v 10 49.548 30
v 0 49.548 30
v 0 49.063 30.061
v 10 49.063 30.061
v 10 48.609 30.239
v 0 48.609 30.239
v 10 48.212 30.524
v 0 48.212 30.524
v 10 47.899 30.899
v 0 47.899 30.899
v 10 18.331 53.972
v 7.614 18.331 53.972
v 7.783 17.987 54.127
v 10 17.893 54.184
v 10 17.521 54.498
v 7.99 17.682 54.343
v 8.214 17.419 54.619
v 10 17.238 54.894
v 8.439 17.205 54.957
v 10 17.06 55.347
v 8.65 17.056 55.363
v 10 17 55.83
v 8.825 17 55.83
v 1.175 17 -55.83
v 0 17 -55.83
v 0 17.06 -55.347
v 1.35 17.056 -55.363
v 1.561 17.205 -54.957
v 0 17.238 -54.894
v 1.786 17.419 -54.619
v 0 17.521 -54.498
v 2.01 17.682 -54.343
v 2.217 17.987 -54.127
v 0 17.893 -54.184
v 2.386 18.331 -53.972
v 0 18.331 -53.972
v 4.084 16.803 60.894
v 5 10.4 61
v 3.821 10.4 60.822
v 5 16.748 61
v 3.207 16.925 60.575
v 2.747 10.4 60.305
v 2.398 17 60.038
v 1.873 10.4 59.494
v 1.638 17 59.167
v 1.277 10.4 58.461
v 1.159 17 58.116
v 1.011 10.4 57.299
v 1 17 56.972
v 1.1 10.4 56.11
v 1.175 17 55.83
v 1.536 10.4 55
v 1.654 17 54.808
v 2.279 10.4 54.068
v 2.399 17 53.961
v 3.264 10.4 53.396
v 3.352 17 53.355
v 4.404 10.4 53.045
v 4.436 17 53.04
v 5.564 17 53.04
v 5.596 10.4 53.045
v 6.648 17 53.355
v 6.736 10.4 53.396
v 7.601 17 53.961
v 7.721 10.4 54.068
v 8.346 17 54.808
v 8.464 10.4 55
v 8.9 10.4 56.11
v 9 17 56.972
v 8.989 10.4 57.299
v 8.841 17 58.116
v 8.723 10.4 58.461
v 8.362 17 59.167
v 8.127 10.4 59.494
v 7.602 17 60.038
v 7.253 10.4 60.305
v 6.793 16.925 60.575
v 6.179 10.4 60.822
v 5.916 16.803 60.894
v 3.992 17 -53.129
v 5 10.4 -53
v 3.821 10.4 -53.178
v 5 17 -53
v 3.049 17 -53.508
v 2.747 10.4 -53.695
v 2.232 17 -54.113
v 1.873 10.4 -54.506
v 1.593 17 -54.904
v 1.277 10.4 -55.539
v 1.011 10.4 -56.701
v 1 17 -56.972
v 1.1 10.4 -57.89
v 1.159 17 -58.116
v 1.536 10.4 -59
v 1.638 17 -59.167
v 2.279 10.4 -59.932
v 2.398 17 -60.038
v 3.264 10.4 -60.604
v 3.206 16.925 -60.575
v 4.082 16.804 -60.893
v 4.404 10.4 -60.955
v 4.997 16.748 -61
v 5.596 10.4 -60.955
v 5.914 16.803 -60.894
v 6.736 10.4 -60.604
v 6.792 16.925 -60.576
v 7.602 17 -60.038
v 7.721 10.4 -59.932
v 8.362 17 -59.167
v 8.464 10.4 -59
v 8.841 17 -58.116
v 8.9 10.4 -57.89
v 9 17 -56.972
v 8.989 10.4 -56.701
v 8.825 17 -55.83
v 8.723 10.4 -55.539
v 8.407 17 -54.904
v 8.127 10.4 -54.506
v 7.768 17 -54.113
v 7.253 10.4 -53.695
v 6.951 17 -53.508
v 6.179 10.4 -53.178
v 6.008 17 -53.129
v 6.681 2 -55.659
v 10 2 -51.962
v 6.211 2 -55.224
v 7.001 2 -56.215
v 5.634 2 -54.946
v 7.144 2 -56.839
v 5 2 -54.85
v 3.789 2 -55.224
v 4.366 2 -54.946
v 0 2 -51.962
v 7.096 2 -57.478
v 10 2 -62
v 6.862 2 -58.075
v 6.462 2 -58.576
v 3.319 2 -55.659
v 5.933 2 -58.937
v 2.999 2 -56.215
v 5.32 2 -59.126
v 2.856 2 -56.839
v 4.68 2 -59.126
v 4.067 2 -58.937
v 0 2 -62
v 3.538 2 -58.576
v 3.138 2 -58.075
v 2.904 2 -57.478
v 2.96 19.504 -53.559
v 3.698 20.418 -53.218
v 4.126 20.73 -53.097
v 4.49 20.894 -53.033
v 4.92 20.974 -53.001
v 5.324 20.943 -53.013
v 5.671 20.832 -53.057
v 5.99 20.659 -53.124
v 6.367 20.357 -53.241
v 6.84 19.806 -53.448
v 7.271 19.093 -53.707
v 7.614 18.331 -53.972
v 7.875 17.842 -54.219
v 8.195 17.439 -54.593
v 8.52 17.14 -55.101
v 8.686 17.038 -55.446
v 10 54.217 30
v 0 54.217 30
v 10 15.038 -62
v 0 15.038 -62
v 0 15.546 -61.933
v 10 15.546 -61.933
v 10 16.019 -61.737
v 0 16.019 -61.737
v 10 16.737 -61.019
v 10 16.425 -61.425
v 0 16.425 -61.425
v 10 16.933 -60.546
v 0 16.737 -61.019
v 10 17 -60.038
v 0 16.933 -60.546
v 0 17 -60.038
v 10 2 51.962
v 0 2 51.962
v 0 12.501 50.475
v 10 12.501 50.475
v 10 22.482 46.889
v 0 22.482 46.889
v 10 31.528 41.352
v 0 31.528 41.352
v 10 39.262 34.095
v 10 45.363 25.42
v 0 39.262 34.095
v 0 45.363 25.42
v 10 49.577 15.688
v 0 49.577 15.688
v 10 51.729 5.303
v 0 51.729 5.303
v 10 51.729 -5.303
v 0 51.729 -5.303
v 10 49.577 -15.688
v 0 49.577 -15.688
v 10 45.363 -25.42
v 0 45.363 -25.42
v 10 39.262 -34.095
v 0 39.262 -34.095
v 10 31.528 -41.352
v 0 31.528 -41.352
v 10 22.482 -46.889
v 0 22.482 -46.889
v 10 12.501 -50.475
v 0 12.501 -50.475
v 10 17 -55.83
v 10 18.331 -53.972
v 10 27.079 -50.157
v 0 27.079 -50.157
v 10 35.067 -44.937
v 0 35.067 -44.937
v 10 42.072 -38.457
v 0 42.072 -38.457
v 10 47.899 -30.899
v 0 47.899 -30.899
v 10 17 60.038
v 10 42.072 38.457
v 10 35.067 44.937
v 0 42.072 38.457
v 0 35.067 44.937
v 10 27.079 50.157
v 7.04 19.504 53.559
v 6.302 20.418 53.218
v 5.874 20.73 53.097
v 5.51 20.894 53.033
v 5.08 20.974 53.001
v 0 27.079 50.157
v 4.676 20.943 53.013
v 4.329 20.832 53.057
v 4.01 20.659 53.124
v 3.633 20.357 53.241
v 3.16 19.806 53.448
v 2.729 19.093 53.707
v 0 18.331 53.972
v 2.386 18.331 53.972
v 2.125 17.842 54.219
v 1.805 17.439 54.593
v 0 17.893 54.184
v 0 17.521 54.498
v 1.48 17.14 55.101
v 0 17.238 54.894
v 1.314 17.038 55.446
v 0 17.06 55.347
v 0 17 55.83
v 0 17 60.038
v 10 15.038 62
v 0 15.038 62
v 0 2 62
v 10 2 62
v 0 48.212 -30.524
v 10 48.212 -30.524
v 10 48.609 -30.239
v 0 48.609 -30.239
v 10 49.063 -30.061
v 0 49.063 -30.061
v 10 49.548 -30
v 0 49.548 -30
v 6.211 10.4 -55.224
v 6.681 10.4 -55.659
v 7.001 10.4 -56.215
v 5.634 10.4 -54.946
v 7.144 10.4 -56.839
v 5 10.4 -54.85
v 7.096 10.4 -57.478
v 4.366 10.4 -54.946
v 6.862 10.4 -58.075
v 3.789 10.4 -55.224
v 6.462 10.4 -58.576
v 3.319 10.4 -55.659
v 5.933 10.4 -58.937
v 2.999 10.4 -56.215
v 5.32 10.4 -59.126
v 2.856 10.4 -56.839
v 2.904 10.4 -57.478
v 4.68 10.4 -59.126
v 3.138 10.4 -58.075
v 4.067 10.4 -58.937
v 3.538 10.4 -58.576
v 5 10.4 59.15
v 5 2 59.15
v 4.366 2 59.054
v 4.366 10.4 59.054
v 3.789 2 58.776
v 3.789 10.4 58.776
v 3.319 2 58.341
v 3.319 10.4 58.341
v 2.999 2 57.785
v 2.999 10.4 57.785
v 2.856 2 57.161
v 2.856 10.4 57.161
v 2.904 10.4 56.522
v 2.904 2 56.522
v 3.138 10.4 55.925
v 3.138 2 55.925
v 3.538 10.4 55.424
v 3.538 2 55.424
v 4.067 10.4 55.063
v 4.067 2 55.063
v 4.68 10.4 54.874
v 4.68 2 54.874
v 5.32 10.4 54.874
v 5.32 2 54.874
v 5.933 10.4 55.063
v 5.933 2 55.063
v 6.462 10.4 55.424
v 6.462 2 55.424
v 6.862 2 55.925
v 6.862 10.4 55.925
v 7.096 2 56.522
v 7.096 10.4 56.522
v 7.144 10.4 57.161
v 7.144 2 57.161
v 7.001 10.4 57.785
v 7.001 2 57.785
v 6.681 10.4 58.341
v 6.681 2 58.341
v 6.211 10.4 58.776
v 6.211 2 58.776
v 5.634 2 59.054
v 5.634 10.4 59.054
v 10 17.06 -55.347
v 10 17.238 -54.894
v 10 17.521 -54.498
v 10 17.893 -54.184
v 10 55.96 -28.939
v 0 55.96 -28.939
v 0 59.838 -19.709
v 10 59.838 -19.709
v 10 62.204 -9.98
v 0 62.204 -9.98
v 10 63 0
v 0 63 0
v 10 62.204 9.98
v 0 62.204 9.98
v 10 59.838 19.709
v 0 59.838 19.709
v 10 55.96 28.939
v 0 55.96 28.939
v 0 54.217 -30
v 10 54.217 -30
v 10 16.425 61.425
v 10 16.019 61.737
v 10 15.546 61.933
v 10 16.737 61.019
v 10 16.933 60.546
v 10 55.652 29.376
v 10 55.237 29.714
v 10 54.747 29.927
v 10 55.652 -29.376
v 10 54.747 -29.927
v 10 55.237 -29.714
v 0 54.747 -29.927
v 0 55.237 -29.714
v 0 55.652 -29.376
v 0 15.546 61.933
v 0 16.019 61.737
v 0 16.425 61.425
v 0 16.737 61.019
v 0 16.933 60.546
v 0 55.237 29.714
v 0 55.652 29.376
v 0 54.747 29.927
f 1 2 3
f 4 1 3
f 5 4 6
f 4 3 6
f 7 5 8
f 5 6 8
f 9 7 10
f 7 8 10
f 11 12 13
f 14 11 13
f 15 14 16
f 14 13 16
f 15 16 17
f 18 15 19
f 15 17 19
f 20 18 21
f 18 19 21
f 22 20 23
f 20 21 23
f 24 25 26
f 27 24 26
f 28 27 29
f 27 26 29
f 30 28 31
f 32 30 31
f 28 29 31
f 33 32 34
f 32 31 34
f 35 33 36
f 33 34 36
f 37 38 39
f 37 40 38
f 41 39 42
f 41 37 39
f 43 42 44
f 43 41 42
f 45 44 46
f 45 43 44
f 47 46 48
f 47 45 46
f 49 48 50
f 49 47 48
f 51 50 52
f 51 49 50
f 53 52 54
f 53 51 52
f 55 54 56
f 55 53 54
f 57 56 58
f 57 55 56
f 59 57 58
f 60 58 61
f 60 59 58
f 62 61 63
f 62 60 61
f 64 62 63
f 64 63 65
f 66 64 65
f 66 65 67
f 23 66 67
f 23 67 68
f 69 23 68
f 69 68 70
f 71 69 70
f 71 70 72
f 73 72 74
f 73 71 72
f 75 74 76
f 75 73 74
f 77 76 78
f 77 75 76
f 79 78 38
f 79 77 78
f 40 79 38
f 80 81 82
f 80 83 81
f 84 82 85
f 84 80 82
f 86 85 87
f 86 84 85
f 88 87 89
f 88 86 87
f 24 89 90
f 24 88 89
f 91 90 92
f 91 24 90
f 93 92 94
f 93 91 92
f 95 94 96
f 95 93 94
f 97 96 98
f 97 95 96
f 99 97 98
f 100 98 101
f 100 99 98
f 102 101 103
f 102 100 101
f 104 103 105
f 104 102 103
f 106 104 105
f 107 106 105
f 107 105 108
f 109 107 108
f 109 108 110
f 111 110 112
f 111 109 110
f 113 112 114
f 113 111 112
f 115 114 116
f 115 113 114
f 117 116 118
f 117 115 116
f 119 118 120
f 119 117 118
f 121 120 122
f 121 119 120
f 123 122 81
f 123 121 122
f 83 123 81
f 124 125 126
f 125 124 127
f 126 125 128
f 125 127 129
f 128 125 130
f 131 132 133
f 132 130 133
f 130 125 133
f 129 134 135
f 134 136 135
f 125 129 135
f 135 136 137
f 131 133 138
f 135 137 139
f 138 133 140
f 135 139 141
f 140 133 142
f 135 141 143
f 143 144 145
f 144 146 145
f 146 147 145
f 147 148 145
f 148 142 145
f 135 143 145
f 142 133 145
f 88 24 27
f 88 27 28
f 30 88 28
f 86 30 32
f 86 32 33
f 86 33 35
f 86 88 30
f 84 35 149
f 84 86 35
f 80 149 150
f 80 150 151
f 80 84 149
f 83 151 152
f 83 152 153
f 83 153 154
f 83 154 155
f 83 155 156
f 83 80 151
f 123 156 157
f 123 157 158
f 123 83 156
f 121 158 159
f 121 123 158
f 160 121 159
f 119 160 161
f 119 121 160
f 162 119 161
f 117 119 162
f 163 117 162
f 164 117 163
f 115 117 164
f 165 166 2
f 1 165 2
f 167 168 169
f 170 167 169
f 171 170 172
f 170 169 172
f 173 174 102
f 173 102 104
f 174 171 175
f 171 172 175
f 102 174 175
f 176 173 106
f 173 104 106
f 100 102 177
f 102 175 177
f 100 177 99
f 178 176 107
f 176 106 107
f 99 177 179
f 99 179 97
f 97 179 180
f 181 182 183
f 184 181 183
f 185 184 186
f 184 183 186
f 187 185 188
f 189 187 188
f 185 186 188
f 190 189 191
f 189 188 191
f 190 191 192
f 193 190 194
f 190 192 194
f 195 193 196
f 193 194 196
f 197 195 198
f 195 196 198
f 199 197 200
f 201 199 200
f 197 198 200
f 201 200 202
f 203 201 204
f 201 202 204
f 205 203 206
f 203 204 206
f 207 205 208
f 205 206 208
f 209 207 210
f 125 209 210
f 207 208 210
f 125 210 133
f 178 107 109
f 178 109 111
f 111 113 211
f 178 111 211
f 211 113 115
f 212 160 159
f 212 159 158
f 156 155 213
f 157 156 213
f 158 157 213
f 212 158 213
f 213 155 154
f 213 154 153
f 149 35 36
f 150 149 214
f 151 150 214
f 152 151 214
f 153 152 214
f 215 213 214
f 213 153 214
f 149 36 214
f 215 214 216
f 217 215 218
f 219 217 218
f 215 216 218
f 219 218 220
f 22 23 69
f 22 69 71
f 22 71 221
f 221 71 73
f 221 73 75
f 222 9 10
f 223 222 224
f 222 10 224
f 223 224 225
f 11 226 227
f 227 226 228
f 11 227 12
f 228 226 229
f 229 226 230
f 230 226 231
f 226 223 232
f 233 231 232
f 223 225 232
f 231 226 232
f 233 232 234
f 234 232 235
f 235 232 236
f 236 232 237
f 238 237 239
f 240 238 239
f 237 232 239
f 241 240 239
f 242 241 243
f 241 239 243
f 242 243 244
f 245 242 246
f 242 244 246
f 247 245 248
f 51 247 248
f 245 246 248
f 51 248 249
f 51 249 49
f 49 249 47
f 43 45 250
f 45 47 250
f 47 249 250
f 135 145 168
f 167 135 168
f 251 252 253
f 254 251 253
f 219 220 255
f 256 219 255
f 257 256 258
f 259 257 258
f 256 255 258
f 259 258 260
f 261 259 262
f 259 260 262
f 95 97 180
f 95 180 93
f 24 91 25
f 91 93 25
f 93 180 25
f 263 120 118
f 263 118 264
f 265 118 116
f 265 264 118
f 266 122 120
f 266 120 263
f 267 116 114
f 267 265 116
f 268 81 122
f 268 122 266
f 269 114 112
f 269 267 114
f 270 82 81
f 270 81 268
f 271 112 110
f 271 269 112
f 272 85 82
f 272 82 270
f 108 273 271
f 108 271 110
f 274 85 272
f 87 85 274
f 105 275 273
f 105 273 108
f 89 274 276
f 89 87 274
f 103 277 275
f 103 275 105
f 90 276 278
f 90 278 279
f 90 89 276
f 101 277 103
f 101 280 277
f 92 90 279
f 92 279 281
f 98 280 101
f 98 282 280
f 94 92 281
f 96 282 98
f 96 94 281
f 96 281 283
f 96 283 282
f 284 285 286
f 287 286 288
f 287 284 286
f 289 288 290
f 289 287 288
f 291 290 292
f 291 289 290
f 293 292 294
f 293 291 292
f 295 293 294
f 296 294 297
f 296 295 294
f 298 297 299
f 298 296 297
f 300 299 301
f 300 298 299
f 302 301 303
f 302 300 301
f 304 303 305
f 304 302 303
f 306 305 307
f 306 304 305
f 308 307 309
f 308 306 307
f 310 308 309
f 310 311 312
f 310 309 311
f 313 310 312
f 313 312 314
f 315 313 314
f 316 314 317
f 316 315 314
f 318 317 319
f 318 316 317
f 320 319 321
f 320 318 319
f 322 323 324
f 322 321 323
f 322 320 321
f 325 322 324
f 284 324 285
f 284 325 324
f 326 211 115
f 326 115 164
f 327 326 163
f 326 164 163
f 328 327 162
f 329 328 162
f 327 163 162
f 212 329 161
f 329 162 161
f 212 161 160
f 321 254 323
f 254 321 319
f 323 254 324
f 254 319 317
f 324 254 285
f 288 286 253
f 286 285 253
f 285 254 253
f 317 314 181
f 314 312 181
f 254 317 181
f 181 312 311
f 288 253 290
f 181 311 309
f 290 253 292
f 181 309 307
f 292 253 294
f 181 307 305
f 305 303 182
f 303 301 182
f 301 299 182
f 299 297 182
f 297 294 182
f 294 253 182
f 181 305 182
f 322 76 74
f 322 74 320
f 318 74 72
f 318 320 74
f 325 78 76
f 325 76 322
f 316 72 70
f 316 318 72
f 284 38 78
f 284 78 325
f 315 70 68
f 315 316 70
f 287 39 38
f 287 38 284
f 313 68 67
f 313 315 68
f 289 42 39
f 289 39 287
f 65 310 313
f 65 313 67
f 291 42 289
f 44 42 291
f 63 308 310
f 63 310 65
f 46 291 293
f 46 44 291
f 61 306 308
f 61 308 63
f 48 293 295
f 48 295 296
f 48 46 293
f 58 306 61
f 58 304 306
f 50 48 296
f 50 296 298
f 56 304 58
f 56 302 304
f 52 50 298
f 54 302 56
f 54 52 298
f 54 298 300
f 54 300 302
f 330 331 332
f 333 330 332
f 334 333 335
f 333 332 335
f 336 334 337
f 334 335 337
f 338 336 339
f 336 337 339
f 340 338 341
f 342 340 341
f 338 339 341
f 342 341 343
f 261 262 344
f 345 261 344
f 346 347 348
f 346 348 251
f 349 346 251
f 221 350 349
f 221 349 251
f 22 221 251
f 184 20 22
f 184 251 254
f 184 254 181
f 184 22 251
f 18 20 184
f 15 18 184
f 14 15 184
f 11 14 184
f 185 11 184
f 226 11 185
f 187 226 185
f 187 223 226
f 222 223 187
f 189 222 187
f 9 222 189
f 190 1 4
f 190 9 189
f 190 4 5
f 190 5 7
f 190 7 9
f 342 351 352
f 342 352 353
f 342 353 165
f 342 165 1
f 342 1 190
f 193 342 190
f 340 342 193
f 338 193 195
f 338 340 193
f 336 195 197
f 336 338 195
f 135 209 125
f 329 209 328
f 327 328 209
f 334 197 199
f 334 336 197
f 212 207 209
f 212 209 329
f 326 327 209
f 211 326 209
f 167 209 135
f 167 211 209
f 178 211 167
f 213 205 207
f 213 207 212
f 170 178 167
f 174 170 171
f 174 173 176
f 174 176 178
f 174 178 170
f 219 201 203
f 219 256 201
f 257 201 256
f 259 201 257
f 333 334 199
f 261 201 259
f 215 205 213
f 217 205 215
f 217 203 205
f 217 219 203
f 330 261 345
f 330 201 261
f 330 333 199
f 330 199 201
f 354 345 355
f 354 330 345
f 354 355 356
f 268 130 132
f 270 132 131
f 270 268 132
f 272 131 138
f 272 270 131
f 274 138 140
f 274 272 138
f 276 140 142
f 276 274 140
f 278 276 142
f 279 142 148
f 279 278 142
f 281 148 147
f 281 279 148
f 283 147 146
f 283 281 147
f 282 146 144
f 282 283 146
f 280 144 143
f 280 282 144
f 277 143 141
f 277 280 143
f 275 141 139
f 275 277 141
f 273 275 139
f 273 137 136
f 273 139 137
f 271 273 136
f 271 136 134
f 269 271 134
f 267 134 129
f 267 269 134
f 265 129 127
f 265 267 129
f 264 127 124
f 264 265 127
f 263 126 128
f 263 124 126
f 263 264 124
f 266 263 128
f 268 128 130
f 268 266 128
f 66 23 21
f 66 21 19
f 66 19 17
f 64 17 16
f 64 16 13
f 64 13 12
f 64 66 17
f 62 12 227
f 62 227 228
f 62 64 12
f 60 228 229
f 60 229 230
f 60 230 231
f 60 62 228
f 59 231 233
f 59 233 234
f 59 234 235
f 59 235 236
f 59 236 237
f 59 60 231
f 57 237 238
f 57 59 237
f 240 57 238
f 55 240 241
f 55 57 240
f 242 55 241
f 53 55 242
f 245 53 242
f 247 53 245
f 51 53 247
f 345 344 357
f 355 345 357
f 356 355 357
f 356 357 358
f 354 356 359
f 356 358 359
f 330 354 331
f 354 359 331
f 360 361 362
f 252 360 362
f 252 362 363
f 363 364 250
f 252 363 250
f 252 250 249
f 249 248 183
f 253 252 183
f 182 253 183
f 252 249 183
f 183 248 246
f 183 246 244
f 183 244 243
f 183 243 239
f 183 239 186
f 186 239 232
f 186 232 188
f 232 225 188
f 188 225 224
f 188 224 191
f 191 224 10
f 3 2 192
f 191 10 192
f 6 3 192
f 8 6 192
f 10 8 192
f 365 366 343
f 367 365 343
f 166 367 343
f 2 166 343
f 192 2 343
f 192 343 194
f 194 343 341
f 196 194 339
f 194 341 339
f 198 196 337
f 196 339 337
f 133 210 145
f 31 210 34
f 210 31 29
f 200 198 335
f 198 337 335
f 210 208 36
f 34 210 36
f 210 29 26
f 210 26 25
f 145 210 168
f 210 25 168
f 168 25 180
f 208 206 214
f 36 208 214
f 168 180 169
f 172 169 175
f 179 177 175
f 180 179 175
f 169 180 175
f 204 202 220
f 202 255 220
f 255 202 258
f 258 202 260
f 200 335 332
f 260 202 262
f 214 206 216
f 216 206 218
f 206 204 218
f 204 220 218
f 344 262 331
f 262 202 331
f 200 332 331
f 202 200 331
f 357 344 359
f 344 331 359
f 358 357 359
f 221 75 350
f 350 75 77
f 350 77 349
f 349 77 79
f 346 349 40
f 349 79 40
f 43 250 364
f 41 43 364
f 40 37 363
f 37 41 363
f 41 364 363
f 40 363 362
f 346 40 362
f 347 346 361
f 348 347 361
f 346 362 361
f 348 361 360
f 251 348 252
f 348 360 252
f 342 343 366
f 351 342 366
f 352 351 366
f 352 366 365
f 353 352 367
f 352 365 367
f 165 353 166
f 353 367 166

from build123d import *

# Parameters (mm, degrees)
BOSS_EXTRUDE1_DEPTH                        = 10
CBORE_FOR_M4_CHEESE_HEAD_SCREW1_AT_2_COUNT = 2
CBORE_FOR_M4_CHEESE_HEAD_SCREW1_AT_2_PITCH = 114
SKETCH6_R                                  = 4
CUT_EXTRUDE1_DEPTH                         = 8


with BuildPart() as part:
    # Sketch1 → Boss-Extrude1 (new body)
    with BuildSketch(Plane(origin=(0, 0, 0), x_dir=(0, 0, -1), z_dir=(1, 0, 0))):
        with BuildLine():
            Line((30, 49.547642934), (30, 54.216993929))
            ThreePointArc((30, 54.216993929), (29.713903717, 55.237294084), (28.93903477, 55.960095305))
            ThreePointArc((28.93903477, 55.960095305), (0, 63), (-28.93903477, 55.960095305))
            ThreePointArc((-28.93903477, 55.960095305), (-29.713903717, 55.237294084), (-30, 54.216993929))
            Line((-30, 54.216993929), (-30, 49.547642934))
            ThreePointArc((-30, 49.547642934), (-30.239236403, 48.608646152), (-30.898614566, 47.898597244))
            ThreePointArc((-30.898614566, 47.898597244), (-44.936698638, 35.066980416), (-53.971882891, 18.331280838))
            ThreePointArc((-53.971882891, 18.331280838), (-54.687108259, 17.367169566), (-55.830018745, 17))
            Line((-55.830018745, 17), (-60.037612586, 17))
            ThreePointArc((-60.037612586, 17), (-61.425230034, 16.425230034), (-62, 15.037612586))
            Line((-62, 15.037612586), (-62, 2))
            Line((-62, 2), (-51.961524227, 2))
            ThreePointArc((-51.961524227, 2), (0, 52), (51.961524227, 2))
            Line((51.961524227, 2), (62, 2))
            Line((62, 2), (62, 15.037612586))
            ThreePointArc((62, 15.037612586), (61.425230034, 16.425230034), (60.037612586, 17))
            Line((60.037612586, 17), (55.830018745, 17))
            ThreePointArc((55.830018745, 17), (54.687108259, 17.367169566), (53.971882891, 18.331280838))
            ThreePointArc((53.971882891, 18.331280838), (44.936698638, 35.066980416), (30.898614566, 47.898597244))
            ThreePointArc((30.898614566, 47.898597244), (30.239236403, 48.608646152), (30, 49.547642934))
        make_face()
    extrude(amount=BOSS_EXTRUDE1_DEPTH)

    # Sketch4 → CBORE for M4 Cheese Head Screw1 (revolve, cut)
    with BuildSketch(Plane(origin=(5, 17, -57), x_dir=(0, 0, 1), z_dir=(1, 0, 0))):
        Polygon((0, 0), (0, 21.291850331), (2.15, 20), (2.15, 6.6), (4, 6.6), (4, 0), align=None)
    cbore_for_m4_cheese_head_screw1 = revolve(axis=Axis((5, 23.35, -57), (0, -1, 0)), mode=Mode.SUBTRACT)

    # CBORE for M4 Cheese Head Screw1 at 2: CBORE for M4 Cheese Head Screw1 ×2
    with Locations(*[(0, 0, i * CBORE_FOR_M4_CHEESE_HEAD_SCREW1_AT_2_PITCH) for i in range(1, CBORE_FOR_M4_CHEESE_HEAD_SCREW1_AT_2_COUNT)]):
        add(cbore_for_m4_cheese_head_screw1, mode=Mode.SUBTRACT)

    # Sketch6 → Cut-Extrude1 (cut)
    with BuildSketch(Plane(origin=(0, 17, 0), x_dir=(1, 0, 0), z_dir=(0, 1, 0))):
        with Locations((5, 57)):
            Circle(SKETCH6_R)
        with Locations((5, -57)):
            Circle(SKETCH6_R)
    extrude(amount=CUT_EXTRUDE1_DEPTH, mode=Mode.SUBTRACT)


solid = part.part
